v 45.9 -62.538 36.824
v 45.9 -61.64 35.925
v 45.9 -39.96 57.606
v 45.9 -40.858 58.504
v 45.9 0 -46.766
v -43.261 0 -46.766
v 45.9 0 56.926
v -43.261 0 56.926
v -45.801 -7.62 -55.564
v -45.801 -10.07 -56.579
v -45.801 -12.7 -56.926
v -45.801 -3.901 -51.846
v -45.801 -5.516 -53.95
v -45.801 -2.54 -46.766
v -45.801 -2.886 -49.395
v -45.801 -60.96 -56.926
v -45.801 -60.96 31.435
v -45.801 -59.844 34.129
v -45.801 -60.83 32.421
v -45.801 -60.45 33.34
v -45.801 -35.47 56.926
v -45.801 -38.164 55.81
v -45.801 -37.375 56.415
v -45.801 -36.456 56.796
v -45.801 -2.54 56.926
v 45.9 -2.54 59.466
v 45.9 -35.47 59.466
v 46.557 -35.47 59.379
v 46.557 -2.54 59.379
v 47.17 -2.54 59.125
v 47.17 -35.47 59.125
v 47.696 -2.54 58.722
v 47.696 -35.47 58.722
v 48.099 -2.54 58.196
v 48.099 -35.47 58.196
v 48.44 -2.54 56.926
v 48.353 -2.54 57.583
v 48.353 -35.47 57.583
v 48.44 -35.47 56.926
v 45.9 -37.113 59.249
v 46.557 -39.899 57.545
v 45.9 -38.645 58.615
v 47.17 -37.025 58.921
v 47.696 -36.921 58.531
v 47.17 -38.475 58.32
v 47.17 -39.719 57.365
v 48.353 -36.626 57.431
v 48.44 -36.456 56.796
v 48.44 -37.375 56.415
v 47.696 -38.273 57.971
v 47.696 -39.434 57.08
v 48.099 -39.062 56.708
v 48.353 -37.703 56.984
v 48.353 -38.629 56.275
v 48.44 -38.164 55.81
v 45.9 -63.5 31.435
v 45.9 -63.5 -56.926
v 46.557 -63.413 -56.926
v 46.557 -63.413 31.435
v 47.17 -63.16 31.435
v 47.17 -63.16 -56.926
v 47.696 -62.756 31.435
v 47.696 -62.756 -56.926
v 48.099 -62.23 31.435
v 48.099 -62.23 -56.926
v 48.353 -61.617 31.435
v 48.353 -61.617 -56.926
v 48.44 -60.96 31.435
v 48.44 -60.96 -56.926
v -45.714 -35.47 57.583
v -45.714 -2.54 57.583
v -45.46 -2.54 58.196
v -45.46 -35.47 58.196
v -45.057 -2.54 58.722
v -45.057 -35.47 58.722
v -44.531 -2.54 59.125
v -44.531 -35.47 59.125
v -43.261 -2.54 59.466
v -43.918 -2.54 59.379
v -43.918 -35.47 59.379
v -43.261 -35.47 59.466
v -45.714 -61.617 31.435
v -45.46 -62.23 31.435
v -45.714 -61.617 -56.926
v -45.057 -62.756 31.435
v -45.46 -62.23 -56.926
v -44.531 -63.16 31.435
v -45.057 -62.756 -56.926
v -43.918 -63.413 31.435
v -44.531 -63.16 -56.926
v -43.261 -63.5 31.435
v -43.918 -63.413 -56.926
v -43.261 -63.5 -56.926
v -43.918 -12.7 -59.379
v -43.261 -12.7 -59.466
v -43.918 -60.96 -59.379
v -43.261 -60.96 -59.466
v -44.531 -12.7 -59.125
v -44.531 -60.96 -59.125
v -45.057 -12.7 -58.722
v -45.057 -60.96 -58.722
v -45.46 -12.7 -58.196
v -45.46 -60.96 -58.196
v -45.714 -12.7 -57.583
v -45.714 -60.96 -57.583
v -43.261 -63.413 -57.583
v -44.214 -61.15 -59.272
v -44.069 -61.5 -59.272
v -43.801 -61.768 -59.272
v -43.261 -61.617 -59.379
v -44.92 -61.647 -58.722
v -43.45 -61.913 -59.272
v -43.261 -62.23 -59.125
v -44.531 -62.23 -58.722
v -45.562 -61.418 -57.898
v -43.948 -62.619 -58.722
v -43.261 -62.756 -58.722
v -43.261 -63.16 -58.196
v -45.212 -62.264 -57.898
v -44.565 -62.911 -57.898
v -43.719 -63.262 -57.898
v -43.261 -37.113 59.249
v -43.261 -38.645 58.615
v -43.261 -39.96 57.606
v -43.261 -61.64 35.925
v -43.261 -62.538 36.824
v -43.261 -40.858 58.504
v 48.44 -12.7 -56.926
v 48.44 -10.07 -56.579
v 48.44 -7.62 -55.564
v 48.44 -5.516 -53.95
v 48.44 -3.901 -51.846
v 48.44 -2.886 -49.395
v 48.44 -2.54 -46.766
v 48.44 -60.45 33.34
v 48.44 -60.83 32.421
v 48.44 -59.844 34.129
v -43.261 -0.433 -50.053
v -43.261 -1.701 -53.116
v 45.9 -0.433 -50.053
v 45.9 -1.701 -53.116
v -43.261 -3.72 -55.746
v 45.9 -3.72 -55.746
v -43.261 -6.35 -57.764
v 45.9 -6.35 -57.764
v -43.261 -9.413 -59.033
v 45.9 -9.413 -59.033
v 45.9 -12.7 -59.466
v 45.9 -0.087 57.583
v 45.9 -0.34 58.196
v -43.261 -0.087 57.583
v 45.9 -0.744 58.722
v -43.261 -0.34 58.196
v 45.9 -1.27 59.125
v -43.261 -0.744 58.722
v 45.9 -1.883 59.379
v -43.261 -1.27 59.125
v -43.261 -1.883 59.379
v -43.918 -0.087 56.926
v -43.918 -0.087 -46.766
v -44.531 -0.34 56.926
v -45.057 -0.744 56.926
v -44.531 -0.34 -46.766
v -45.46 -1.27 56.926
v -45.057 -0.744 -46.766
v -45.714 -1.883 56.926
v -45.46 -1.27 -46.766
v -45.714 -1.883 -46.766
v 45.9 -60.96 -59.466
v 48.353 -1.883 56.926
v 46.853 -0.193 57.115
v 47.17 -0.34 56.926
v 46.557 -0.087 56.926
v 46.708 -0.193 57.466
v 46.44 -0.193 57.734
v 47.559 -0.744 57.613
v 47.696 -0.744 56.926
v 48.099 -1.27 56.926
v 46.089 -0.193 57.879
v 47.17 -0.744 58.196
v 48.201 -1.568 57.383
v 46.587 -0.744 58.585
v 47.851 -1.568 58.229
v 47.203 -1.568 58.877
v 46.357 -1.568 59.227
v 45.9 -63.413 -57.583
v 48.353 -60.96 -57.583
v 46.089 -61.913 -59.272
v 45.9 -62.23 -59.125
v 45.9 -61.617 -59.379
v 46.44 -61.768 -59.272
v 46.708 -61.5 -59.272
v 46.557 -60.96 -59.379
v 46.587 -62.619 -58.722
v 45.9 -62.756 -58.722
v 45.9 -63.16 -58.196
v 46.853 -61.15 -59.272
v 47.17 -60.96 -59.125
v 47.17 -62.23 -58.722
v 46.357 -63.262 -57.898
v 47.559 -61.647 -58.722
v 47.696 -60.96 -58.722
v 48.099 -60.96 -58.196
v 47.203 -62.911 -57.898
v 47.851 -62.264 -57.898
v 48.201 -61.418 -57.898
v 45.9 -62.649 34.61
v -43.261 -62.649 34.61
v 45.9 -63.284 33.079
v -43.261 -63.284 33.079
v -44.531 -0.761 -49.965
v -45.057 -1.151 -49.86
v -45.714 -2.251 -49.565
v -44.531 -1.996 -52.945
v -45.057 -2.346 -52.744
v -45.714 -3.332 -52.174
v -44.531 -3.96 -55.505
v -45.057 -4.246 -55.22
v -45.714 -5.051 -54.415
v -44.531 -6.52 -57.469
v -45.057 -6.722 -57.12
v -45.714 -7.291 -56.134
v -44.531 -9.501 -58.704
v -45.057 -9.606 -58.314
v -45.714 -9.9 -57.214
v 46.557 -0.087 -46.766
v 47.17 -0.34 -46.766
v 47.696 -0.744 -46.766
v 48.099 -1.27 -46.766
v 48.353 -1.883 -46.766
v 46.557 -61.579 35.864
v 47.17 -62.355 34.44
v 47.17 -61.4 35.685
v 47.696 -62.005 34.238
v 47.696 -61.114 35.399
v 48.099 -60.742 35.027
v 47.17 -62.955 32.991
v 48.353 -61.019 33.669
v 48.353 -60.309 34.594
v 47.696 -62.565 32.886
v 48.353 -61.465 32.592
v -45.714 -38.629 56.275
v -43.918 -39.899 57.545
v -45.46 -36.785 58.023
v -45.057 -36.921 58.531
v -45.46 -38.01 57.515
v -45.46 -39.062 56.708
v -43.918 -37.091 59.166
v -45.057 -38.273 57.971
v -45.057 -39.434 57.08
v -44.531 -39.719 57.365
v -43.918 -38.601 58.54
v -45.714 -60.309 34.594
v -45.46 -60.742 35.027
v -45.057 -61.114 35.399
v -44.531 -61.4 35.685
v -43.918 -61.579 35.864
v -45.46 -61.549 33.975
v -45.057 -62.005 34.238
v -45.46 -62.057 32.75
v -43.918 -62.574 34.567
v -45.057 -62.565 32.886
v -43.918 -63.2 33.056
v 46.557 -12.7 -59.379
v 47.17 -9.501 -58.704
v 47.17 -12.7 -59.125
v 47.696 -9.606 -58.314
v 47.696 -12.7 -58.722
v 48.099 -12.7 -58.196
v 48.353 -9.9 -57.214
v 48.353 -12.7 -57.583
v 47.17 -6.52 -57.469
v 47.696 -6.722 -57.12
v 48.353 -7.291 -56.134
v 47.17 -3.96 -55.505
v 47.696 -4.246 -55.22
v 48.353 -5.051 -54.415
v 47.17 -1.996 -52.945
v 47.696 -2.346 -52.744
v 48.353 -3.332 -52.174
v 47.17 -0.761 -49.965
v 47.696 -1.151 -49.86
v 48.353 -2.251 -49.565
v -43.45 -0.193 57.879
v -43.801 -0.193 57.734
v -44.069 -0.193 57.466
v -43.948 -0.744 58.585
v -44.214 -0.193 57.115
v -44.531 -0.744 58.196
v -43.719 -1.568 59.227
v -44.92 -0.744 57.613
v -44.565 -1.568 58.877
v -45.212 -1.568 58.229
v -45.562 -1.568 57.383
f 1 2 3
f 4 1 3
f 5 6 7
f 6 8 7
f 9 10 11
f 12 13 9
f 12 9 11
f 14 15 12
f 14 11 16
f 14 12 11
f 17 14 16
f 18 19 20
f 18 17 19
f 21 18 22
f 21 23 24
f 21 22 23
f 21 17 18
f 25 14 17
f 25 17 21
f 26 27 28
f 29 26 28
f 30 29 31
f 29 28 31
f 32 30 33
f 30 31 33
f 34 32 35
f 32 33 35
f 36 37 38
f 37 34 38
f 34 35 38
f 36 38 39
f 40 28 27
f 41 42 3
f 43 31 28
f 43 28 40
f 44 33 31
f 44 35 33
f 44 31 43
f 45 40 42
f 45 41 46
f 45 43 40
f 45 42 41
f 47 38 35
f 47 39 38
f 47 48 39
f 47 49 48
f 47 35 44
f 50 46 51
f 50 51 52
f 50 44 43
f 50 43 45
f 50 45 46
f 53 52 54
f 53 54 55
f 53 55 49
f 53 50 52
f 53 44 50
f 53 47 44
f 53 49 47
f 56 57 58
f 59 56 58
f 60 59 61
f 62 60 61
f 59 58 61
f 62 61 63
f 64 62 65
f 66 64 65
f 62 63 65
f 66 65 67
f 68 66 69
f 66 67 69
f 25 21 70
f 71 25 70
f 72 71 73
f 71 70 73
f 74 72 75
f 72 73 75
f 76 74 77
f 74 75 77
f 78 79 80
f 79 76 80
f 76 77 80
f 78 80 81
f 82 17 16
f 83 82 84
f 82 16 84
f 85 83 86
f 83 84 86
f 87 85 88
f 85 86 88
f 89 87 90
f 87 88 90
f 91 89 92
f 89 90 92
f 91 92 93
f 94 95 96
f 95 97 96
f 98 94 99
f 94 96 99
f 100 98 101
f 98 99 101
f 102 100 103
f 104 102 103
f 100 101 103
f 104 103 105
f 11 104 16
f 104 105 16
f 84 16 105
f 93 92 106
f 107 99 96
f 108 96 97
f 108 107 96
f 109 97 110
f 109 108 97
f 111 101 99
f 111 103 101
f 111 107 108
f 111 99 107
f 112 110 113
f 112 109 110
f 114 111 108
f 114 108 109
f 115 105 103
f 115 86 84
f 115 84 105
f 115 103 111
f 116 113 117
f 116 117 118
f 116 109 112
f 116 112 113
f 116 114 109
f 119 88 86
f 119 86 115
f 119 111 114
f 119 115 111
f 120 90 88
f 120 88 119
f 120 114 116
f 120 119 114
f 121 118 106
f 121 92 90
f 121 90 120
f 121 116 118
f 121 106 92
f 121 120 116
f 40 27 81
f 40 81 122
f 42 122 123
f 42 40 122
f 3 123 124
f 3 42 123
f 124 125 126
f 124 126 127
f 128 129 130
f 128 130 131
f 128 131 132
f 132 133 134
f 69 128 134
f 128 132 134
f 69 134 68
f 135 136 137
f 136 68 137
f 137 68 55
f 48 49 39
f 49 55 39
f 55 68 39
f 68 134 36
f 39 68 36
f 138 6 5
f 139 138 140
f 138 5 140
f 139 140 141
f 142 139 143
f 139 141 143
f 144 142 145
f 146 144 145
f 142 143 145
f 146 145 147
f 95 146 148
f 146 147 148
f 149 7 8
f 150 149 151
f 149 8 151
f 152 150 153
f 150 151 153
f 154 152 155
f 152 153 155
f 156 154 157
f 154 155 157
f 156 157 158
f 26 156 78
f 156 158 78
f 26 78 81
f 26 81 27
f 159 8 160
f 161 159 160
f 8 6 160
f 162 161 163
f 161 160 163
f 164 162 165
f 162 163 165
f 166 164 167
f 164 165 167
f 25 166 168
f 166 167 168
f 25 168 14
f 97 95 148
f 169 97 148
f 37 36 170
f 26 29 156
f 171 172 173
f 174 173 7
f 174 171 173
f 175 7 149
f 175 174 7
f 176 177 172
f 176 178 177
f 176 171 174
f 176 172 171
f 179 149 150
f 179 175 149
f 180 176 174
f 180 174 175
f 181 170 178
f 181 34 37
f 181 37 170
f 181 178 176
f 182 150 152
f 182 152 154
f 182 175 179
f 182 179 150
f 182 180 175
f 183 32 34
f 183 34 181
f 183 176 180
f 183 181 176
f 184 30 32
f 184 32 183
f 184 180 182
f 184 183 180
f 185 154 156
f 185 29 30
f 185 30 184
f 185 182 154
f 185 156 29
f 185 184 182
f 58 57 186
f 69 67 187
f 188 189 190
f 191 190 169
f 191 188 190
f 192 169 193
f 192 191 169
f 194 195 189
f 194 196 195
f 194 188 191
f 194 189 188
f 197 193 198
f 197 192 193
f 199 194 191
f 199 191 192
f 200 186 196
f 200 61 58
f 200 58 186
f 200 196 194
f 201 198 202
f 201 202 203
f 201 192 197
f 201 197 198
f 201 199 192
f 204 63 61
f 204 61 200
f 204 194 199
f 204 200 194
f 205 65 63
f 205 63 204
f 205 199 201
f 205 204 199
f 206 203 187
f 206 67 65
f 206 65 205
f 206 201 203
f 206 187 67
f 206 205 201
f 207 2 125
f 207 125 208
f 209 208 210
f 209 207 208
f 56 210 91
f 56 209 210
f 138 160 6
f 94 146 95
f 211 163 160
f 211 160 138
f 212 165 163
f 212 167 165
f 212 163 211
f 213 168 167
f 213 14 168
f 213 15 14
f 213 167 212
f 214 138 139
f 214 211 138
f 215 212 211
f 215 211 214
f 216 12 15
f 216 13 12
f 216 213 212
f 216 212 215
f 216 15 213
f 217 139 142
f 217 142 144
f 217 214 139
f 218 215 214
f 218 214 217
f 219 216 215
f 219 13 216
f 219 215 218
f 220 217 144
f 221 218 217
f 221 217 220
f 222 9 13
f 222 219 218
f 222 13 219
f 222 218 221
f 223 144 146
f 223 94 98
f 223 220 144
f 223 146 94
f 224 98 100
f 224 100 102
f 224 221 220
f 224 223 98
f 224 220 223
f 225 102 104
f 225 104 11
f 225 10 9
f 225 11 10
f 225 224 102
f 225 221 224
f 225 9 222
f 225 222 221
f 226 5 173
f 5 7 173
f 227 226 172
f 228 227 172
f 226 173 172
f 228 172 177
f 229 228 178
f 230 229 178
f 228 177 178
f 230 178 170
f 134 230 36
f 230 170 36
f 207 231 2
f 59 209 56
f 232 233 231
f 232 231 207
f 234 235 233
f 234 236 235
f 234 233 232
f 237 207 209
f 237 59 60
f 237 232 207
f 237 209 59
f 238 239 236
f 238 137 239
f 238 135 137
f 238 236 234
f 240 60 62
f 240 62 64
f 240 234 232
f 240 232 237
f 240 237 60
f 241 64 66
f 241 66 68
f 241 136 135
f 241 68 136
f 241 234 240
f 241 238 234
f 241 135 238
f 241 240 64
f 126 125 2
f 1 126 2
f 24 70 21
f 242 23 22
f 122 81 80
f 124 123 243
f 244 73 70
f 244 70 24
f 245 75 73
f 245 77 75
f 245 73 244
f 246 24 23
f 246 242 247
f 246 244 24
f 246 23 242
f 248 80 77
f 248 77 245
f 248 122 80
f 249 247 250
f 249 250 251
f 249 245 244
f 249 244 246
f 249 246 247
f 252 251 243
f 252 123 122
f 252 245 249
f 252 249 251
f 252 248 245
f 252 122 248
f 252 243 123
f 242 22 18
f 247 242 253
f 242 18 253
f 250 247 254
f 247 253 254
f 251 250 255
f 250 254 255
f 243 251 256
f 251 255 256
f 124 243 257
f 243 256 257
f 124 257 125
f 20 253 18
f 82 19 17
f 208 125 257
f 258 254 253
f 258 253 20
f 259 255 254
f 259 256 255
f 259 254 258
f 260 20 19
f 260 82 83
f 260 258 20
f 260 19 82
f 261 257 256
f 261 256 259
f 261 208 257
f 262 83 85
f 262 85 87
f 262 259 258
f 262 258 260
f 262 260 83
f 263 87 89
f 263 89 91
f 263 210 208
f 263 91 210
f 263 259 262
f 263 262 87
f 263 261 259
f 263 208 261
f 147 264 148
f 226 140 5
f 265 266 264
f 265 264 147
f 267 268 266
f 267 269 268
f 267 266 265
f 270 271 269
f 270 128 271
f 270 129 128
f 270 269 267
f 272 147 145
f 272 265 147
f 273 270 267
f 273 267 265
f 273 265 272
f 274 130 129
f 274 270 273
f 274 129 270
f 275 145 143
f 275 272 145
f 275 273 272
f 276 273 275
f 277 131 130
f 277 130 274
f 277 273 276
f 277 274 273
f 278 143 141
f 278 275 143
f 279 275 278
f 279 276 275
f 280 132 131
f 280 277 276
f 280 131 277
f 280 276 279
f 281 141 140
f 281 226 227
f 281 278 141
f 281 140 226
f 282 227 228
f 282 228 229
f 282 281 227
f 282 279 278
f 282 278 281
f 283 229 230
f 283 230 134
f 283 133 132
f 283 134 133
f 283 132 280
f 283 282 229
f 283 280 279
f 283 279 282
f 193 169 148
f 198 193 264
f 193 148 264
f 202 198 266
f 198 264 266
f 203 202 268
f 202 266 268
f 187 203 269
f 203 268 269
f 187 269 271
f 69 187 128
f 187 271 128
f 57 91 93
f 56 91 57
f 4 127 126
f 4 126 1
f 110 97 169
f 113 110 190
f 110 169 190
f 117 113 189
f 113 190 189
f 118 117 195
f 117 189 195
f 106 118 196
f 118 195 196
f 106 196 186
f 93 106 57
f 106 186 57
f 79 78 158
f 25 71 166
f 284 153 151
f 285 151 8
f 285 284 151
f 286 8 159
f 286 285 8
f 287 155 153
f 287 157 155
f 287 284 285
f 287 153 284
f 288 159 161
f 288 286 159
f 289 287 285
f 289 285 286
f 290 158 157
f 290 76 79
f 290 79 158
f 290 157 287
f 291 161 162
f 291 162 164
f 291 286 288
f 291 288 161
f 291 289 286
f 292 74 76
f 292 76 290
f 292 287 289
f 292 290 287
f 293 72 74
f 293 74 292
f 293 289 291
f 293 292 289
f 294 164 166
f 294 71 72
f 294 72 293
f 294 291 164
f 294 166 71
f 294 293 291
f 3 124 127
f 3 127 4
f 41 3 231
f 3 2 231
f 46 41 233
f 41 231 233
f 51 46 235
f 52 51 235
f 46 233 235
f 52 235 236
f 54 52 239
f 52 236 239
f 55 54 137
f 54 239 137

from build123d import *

# Parameters (mm, degrees)
F0_W     = 94.2402782384
F0_H     = 118.9312338829
F1_DEPTH = 63.5
F2_SIZE  = 25.4
F3_R     = 6.35
F4_R     = 2.54
F5_R     = 12.7
F6_R     = 2.54
F7_W     = 89.1602782384
F7_H     = 30.6605122421
F8_DEPTH = 1.27


with BuildPart() as f1:
    # F0 (on Front) → F1 (new body)
    with BuildSketch(Plane.XZ):
        with Locations((1.3193635968, 0)):
            Rectangle(F0_W, F0_H)
    extrude(amount=F1_DEPTH)

    # F2
    f2_edges = [f1.edges().sort_by_distance(p)[0] for p in [
        (1.319364, -63.5, 59.465617),
    ]]
    chamfer(f2_edges, length=F2_SIZE)

    # F3
    f3_edges = [f1.edges().sort_by_distance(p)[0] for p in [
        (1.319364, -63.5, 34.065617),
        (1.319364, -38.1, 59.465617),
    ]]
    fillet(f3_edges, radius=F3_R)

    # F4
    f4_edges = [f1.edges().sort_by_distance(p)[0] for p in [
        (-45.800776, -17.734872, 59.465617),
        (-45.800776, -50.8, 46.765617),
        (-45.800776, -63.5, -14.015128),
        (-45.800776, -63.016635, 33.865401),
        (-45.800776, -37.899784, 58.982252),
        (48.439503, -17.734872, 59.465617),
        (48.439503, -37.899784, 58.982252),
        (48.439503, -50.8, 46.765617),
        (48.439503, -63.016635, 33.865401),
        (48.439503, -63.5, -14.015128),
    ]]
    fillet(f4_edges, radius=F4_R)

    # F5
    f5_edges = [f1.edges().sort_by_distance(p)[0] for p in [
        (1.319364, 0, -59.465617),
    ]]
    fillet(f5_edges, radius=F5_R)

    # F6
    f6_edges = [f1.edges().sort_by_distance(p)[0] for p in [
        (48.439503, 0, 5.08),
        (48.439503, -3.719744, -55.745873),
        (-45.800776, 0, 5.08),
        (-45.800776, -3.719744, -55.745873),
    ]]
    fillet(f6_edges, radius=F6_R)

    # F7 (on face) → F8 (join)
    with BuildSketch(Plane(origin=(0, -48.7828084707, 48.7828084707), x_dir=(1, 0, 0), z_dir=(0, -0.7071067812, 0.7071067812))):
        with Locations((1.3193635968, -2.8527396186)):
            Rectangle(F7_W, F7_H)
    extrude(amount=F8_DEPTH)


solid = f1.part
